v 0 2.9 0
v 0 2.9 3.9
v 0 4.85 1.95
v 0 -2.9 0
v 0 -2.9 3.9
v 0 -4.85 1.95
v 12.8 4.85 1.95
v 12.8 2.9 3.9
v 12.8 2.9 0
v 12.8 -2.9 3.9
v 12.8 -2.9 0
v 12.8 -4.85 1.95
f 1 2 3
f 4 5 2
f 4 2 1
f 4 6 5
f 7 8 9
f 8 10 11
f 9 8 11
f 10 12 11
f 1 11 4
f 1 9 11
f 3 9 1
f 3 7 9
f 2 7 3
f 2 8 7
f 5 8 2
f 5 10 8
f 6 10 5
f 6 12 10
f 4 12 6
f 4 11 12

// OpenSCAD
include <../lib/servo-duct-manifold-lib.scad>;
$fn = 96;
clip();
